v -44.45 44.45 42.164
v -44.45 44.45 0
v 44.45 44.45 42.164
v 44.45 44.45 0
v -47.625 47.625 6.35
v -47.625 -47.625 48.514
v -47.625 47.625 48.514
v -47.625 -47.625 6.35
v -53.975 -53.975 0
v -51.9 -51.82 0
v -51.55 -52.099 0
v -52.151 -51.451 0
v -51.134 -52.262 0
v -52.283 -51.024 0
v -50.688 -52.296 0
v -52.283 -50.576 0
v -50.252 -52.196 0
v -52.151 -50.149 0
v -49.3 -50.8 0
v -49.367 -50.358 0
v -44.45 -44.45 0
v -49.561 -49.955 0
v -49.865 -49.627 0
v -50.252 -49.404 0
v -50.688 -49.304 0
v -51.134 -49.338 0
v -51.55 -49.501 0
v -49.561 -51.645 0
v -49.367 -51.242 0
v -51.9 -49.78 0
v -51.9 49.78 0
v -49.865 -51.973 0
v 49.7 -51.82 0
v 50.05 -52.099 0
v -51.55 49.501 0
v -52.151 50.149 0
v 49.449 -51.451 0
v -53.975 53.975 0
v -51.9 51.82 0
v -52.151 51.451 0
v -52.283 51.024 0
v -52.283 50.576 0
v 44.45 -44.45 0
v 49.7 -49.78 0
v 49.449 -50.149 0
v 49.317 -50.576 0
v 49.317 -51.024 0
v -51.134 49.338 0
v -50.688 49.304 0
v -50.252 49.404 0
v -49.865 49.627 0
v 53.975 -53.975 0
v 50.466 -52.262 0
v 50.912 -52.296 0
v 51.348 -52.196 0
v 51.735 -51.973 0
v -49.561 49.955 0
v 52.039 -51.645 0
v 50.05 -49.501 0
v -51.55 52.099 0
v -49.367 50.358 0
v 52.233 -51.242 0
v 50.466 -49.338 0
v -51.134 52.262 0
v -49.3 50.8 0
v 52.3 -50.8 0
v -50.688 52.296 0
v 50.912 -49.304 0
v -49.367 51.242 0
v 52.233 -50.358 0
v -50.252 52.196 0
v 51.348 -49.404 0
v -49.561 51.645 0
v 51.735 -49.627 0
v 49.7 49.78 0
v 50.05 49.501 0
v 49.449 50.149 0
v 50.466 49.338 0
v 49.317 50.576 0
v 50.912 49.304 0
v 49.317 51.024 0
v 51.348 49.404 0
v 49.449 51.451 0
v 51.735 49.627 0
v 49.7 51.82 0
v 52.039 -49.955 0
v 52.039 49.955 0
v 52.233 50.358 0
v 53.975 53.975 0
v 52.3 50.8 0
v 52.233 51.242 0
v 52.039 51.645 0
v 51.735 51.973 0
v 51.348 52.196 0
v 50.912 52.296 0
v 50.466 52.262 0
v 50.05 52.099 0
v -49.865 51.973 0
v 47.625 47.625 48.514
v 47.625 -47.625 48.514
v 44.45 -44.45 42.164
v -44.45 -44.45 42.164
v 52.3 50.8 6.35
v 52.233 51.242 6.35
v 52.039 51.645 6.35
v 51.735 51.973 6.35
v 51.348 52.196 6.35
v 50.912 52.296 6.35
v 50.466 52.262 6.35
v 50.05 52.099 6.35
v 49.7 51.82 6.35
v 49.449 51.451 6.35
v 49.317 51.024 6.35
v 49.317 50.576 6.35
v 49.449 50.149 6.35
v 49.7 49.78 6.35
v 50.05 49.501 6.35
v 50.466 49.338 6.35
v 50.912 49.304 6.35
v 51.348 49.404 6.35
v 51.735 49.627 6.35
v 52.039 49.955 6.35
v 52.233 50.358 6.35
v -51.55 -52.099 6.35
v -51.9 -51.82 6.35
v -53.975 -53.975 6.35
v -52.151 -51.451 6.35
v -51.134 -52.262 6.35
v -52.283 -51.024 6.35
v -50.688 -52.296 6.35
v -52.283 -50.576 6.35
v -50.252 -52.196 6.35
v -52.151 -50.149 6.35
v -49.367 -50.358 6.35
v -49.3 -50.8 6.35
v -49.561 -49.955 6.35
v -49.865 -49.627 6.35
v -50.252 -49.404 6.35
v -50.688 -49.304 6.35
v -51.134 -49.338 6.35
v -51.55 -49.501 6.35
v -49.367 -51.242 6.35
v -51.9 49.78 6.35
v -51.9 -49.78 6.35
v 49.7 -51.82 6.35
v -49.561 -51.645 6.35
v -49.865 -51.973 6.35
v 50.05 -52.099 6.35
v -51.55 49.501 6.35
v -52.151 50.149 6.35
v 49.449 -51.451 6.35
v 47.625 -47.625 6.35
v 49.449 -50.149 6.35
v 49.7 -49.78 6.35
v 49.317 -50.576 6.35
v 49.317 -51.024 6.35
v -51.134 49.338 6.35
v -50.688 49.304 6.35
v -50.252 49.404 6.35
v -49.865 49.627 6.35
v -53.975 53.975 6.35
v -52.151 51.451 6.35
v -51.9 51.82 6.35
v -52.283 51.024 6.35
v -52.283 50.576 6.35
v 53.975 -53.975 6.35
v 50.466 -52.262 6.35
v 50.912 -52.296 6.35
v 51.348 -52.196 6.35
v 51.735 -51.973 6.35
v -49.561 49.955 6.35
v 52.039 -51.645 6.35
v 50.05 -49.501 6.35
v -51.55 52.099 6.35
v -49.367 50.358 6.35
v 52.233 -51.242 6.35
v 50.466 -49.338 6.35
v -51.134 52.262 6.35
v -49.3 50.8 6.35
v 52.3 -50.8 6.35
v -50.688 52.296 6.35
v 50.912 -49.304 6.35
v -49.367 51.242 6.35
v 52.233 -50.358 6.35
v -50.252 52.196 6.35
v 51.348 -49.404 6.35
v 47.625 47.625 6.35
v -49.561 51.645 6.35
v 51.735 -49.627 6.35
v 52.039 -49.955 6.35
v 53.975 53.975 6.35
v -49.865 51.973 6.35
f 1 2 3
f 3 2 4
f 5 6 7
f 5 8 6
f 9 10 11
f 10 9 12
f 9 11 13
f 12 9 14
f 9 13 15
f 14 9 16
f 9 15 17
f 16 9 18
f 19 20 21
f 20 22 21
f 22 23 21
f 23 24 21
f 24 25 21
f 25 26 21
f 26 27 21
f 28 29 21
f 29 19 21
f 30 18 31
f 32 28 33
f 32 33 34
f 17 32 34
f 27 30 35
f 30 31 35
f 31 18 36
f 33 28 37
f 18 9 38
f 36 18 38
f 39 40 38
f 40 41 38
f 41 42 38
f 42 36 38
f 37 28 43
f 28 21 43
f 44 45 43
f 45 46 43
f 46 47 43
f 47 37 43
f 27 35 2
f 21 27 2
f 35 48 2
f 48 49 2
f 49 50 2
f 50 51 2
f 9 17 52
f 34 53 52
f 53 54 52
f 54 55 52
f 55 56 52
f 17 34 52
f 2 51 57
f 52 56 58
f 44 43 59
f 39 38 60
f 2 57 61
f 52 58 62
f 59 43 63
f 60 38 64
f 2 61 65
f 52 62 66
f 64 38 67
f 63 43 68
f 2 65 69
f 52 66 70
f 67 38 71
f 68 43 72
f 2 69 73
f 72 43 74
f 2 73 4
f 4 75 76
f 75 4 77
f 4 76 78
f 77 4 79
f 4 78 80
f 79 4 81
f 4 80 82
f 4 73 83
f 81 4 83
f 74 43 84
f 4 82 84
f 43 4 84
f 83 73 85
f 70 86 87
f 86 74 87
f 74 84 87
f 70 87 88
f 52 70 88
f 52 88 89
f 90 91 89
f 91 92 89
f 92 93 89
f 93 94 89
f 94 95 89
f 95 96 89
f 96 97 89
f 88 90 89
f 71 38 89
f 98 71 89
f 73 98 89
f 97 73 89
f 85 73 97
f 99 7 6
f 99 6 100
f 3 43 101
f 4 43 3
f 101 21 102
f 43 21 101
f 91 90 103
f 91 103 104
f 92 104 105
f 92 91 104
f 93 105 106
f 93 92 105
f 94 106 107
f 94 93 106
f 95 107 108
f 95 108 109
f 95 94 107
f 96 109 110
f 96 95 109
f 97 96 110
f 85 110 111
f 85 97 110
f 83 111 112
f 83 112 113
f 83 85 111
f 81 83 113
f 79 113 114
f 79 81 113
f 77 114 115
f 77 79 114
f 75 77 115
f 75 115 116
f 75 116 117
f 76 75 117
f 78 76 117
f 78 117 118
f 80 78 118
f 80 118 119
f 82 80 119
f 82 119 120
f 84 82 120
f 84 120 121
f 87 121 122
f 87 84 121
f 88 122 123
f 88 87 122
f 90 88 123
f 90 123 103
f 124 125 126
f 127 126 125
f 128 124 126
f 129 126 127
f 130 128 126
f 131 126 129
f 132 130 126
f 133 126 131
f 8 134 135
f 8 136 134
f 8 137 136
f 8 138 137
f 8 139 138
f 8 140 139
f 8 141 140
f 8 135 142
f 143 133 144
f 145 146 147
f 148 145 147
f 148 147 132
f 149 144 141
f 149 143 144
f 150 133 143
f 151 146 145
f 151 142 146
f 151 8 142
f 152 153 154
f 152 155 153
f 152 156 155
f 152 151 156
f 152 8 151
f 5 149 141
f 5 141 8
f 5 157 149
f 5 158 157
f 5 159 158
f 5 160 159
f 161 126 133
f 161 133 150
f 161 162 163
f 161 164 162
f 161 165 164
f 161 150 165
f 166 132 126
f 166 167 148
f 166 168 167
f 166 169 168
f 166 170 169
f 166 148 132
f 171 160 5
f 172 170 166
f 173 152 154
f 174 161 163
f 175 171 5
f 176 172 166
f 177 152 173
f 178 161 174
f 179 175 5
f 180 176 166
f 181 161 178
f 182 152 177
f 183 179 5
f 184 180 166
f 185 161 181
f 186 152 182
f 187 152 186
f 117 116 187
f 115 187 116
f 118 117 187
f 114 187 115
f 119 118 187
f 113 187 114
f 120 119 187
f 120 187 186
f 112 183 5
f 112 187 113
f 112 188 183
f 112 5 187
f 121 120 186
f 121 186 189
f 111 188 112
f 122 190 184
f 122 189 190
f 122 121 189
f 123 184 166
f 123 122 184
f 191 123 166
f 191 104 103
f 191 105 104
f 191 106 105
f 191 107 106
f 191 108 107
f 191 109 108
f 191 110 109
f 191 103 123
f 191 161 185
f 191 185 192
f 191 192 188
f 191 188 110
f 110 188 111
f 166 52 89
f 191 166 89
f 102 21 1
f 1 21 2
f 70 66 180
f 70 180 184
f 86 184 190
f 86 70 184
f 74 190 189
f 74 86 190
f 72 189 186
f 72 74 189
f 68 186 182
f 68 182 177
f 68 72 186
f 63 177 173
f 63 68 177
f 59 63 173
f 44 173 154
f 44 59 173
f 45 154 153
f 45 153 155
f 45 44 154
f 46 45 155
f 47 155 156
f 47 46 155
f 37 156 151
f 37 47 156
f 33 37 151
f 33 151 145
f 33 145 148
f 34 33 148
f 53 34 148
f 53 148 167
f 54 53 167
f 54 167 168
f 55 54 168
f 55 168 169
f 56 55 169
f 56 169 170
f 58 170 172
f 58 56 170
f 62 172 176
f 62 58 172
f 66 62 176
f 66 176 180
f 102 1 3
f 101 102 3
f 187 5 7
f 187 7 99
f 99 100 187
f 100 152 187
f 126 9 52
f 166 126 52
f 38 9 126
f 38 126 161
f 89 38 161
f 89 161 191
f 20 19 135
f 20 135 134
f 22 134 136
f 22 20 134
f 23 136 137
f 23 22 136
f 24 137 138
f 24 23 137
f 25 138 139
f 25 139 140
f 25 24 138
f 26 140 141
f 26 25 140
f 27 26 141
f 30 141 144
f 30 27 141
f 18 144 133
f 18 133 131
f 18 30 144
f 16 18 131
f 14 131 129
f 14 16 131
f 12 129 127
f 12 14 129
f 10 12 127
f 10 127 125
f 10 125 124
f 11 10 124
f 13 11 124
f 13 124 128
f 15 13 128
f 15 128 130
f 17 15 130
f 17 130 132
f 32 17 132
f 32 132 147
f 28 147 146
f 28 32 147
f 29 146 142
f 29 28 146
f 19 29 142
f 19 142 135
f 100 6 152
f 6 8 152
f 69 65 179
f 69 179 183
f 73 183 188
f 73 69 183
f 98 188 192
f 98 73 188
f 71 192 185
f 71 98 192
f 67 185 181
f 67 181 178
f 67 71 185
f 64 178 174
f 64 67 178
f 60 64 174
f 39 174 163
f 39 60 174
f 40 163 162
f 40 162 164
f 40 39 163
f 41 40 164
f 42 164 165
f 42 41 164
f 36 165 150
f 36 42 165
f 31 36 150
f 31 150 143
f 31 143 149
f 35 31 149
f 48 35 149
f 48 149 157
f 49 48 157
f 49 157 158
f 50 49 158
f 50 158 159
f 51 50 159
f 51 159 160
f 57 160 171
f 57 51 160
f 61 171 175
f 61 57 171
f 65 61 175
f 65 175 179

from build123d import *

# Parameters (mm, degrees)
SKETCH6_W           = 95.25
SKETCH6_H           = 95.25
SKETCH6_W_2         = 88.9
SKETCH6_H_2         = 88.9
BOSS_EXTRUDE3_DEPTH = 42.164
SKETCH7_W           = 107.95
SKETCH7_H           = 107.95
SKETCH7_R           = 1.5
SKETCH7_W_2         = 95.25
SKETCH7_H_2         = 95.25
BOSS_EXTRUDE4_DEPTH = 6.35
SKETCH8_W           = 95.25
SKETCH8_H           = 95.25
BOSS_EXTRUDE5_DEPTH = 6.35


with BuildPart() as part:
    # Sketch6 → Boss-Extrude3 (new body)
    with BuildSketch(Plane.XY):
        Rectangle(SKETCH6_W, SKETCH6_H)
        Rectangle(SKETCH6_W_2, SKETCH6_H_2, mode=Mode.SUBTRACT)
    extrude(amount=BOSS_EXTRUDE3_DEPTH)

    # Sketch7 → Boss-Extrude4 (add)
    with BuildSketch(Plane.XY):
        Rectangle(SKETCH7_W, SKETCH7_H)
        with Locations((-50.8, 50.8)):
            Circle(SKETCH7_R, mode=Mode.SUBTRACT)
        with Locations((50.8, 50.8)):
            Circle(SKETCH7_R, mode=Mode.SUBTRACT)
        with Locations((-50.8, -50.8)):
            Circle(SKETCH7_R, mode=Mode.SUBTRACT)
        with Locations((50.8, -50.8)):
            Circle(SKETCH7_R, mode=Mode.SUBTRACT)
        Rectangle(SKETCH7_W_2, SKETCH7_H_2, mode=Mode.SUBTRACT)
    extrude(amount=BOSS_EXTRUDE4_DEPTH)

    # Sketch8 → Boss-Extrude5 (add)
    with BuildSketch(Plane.XY.offset(42.164)):
        Rectangle(SKETCH8_W, SKETCH8_H)
    extrude(amount=BOSS_EXTRUDE5_DEPTH)


solid = part.part
